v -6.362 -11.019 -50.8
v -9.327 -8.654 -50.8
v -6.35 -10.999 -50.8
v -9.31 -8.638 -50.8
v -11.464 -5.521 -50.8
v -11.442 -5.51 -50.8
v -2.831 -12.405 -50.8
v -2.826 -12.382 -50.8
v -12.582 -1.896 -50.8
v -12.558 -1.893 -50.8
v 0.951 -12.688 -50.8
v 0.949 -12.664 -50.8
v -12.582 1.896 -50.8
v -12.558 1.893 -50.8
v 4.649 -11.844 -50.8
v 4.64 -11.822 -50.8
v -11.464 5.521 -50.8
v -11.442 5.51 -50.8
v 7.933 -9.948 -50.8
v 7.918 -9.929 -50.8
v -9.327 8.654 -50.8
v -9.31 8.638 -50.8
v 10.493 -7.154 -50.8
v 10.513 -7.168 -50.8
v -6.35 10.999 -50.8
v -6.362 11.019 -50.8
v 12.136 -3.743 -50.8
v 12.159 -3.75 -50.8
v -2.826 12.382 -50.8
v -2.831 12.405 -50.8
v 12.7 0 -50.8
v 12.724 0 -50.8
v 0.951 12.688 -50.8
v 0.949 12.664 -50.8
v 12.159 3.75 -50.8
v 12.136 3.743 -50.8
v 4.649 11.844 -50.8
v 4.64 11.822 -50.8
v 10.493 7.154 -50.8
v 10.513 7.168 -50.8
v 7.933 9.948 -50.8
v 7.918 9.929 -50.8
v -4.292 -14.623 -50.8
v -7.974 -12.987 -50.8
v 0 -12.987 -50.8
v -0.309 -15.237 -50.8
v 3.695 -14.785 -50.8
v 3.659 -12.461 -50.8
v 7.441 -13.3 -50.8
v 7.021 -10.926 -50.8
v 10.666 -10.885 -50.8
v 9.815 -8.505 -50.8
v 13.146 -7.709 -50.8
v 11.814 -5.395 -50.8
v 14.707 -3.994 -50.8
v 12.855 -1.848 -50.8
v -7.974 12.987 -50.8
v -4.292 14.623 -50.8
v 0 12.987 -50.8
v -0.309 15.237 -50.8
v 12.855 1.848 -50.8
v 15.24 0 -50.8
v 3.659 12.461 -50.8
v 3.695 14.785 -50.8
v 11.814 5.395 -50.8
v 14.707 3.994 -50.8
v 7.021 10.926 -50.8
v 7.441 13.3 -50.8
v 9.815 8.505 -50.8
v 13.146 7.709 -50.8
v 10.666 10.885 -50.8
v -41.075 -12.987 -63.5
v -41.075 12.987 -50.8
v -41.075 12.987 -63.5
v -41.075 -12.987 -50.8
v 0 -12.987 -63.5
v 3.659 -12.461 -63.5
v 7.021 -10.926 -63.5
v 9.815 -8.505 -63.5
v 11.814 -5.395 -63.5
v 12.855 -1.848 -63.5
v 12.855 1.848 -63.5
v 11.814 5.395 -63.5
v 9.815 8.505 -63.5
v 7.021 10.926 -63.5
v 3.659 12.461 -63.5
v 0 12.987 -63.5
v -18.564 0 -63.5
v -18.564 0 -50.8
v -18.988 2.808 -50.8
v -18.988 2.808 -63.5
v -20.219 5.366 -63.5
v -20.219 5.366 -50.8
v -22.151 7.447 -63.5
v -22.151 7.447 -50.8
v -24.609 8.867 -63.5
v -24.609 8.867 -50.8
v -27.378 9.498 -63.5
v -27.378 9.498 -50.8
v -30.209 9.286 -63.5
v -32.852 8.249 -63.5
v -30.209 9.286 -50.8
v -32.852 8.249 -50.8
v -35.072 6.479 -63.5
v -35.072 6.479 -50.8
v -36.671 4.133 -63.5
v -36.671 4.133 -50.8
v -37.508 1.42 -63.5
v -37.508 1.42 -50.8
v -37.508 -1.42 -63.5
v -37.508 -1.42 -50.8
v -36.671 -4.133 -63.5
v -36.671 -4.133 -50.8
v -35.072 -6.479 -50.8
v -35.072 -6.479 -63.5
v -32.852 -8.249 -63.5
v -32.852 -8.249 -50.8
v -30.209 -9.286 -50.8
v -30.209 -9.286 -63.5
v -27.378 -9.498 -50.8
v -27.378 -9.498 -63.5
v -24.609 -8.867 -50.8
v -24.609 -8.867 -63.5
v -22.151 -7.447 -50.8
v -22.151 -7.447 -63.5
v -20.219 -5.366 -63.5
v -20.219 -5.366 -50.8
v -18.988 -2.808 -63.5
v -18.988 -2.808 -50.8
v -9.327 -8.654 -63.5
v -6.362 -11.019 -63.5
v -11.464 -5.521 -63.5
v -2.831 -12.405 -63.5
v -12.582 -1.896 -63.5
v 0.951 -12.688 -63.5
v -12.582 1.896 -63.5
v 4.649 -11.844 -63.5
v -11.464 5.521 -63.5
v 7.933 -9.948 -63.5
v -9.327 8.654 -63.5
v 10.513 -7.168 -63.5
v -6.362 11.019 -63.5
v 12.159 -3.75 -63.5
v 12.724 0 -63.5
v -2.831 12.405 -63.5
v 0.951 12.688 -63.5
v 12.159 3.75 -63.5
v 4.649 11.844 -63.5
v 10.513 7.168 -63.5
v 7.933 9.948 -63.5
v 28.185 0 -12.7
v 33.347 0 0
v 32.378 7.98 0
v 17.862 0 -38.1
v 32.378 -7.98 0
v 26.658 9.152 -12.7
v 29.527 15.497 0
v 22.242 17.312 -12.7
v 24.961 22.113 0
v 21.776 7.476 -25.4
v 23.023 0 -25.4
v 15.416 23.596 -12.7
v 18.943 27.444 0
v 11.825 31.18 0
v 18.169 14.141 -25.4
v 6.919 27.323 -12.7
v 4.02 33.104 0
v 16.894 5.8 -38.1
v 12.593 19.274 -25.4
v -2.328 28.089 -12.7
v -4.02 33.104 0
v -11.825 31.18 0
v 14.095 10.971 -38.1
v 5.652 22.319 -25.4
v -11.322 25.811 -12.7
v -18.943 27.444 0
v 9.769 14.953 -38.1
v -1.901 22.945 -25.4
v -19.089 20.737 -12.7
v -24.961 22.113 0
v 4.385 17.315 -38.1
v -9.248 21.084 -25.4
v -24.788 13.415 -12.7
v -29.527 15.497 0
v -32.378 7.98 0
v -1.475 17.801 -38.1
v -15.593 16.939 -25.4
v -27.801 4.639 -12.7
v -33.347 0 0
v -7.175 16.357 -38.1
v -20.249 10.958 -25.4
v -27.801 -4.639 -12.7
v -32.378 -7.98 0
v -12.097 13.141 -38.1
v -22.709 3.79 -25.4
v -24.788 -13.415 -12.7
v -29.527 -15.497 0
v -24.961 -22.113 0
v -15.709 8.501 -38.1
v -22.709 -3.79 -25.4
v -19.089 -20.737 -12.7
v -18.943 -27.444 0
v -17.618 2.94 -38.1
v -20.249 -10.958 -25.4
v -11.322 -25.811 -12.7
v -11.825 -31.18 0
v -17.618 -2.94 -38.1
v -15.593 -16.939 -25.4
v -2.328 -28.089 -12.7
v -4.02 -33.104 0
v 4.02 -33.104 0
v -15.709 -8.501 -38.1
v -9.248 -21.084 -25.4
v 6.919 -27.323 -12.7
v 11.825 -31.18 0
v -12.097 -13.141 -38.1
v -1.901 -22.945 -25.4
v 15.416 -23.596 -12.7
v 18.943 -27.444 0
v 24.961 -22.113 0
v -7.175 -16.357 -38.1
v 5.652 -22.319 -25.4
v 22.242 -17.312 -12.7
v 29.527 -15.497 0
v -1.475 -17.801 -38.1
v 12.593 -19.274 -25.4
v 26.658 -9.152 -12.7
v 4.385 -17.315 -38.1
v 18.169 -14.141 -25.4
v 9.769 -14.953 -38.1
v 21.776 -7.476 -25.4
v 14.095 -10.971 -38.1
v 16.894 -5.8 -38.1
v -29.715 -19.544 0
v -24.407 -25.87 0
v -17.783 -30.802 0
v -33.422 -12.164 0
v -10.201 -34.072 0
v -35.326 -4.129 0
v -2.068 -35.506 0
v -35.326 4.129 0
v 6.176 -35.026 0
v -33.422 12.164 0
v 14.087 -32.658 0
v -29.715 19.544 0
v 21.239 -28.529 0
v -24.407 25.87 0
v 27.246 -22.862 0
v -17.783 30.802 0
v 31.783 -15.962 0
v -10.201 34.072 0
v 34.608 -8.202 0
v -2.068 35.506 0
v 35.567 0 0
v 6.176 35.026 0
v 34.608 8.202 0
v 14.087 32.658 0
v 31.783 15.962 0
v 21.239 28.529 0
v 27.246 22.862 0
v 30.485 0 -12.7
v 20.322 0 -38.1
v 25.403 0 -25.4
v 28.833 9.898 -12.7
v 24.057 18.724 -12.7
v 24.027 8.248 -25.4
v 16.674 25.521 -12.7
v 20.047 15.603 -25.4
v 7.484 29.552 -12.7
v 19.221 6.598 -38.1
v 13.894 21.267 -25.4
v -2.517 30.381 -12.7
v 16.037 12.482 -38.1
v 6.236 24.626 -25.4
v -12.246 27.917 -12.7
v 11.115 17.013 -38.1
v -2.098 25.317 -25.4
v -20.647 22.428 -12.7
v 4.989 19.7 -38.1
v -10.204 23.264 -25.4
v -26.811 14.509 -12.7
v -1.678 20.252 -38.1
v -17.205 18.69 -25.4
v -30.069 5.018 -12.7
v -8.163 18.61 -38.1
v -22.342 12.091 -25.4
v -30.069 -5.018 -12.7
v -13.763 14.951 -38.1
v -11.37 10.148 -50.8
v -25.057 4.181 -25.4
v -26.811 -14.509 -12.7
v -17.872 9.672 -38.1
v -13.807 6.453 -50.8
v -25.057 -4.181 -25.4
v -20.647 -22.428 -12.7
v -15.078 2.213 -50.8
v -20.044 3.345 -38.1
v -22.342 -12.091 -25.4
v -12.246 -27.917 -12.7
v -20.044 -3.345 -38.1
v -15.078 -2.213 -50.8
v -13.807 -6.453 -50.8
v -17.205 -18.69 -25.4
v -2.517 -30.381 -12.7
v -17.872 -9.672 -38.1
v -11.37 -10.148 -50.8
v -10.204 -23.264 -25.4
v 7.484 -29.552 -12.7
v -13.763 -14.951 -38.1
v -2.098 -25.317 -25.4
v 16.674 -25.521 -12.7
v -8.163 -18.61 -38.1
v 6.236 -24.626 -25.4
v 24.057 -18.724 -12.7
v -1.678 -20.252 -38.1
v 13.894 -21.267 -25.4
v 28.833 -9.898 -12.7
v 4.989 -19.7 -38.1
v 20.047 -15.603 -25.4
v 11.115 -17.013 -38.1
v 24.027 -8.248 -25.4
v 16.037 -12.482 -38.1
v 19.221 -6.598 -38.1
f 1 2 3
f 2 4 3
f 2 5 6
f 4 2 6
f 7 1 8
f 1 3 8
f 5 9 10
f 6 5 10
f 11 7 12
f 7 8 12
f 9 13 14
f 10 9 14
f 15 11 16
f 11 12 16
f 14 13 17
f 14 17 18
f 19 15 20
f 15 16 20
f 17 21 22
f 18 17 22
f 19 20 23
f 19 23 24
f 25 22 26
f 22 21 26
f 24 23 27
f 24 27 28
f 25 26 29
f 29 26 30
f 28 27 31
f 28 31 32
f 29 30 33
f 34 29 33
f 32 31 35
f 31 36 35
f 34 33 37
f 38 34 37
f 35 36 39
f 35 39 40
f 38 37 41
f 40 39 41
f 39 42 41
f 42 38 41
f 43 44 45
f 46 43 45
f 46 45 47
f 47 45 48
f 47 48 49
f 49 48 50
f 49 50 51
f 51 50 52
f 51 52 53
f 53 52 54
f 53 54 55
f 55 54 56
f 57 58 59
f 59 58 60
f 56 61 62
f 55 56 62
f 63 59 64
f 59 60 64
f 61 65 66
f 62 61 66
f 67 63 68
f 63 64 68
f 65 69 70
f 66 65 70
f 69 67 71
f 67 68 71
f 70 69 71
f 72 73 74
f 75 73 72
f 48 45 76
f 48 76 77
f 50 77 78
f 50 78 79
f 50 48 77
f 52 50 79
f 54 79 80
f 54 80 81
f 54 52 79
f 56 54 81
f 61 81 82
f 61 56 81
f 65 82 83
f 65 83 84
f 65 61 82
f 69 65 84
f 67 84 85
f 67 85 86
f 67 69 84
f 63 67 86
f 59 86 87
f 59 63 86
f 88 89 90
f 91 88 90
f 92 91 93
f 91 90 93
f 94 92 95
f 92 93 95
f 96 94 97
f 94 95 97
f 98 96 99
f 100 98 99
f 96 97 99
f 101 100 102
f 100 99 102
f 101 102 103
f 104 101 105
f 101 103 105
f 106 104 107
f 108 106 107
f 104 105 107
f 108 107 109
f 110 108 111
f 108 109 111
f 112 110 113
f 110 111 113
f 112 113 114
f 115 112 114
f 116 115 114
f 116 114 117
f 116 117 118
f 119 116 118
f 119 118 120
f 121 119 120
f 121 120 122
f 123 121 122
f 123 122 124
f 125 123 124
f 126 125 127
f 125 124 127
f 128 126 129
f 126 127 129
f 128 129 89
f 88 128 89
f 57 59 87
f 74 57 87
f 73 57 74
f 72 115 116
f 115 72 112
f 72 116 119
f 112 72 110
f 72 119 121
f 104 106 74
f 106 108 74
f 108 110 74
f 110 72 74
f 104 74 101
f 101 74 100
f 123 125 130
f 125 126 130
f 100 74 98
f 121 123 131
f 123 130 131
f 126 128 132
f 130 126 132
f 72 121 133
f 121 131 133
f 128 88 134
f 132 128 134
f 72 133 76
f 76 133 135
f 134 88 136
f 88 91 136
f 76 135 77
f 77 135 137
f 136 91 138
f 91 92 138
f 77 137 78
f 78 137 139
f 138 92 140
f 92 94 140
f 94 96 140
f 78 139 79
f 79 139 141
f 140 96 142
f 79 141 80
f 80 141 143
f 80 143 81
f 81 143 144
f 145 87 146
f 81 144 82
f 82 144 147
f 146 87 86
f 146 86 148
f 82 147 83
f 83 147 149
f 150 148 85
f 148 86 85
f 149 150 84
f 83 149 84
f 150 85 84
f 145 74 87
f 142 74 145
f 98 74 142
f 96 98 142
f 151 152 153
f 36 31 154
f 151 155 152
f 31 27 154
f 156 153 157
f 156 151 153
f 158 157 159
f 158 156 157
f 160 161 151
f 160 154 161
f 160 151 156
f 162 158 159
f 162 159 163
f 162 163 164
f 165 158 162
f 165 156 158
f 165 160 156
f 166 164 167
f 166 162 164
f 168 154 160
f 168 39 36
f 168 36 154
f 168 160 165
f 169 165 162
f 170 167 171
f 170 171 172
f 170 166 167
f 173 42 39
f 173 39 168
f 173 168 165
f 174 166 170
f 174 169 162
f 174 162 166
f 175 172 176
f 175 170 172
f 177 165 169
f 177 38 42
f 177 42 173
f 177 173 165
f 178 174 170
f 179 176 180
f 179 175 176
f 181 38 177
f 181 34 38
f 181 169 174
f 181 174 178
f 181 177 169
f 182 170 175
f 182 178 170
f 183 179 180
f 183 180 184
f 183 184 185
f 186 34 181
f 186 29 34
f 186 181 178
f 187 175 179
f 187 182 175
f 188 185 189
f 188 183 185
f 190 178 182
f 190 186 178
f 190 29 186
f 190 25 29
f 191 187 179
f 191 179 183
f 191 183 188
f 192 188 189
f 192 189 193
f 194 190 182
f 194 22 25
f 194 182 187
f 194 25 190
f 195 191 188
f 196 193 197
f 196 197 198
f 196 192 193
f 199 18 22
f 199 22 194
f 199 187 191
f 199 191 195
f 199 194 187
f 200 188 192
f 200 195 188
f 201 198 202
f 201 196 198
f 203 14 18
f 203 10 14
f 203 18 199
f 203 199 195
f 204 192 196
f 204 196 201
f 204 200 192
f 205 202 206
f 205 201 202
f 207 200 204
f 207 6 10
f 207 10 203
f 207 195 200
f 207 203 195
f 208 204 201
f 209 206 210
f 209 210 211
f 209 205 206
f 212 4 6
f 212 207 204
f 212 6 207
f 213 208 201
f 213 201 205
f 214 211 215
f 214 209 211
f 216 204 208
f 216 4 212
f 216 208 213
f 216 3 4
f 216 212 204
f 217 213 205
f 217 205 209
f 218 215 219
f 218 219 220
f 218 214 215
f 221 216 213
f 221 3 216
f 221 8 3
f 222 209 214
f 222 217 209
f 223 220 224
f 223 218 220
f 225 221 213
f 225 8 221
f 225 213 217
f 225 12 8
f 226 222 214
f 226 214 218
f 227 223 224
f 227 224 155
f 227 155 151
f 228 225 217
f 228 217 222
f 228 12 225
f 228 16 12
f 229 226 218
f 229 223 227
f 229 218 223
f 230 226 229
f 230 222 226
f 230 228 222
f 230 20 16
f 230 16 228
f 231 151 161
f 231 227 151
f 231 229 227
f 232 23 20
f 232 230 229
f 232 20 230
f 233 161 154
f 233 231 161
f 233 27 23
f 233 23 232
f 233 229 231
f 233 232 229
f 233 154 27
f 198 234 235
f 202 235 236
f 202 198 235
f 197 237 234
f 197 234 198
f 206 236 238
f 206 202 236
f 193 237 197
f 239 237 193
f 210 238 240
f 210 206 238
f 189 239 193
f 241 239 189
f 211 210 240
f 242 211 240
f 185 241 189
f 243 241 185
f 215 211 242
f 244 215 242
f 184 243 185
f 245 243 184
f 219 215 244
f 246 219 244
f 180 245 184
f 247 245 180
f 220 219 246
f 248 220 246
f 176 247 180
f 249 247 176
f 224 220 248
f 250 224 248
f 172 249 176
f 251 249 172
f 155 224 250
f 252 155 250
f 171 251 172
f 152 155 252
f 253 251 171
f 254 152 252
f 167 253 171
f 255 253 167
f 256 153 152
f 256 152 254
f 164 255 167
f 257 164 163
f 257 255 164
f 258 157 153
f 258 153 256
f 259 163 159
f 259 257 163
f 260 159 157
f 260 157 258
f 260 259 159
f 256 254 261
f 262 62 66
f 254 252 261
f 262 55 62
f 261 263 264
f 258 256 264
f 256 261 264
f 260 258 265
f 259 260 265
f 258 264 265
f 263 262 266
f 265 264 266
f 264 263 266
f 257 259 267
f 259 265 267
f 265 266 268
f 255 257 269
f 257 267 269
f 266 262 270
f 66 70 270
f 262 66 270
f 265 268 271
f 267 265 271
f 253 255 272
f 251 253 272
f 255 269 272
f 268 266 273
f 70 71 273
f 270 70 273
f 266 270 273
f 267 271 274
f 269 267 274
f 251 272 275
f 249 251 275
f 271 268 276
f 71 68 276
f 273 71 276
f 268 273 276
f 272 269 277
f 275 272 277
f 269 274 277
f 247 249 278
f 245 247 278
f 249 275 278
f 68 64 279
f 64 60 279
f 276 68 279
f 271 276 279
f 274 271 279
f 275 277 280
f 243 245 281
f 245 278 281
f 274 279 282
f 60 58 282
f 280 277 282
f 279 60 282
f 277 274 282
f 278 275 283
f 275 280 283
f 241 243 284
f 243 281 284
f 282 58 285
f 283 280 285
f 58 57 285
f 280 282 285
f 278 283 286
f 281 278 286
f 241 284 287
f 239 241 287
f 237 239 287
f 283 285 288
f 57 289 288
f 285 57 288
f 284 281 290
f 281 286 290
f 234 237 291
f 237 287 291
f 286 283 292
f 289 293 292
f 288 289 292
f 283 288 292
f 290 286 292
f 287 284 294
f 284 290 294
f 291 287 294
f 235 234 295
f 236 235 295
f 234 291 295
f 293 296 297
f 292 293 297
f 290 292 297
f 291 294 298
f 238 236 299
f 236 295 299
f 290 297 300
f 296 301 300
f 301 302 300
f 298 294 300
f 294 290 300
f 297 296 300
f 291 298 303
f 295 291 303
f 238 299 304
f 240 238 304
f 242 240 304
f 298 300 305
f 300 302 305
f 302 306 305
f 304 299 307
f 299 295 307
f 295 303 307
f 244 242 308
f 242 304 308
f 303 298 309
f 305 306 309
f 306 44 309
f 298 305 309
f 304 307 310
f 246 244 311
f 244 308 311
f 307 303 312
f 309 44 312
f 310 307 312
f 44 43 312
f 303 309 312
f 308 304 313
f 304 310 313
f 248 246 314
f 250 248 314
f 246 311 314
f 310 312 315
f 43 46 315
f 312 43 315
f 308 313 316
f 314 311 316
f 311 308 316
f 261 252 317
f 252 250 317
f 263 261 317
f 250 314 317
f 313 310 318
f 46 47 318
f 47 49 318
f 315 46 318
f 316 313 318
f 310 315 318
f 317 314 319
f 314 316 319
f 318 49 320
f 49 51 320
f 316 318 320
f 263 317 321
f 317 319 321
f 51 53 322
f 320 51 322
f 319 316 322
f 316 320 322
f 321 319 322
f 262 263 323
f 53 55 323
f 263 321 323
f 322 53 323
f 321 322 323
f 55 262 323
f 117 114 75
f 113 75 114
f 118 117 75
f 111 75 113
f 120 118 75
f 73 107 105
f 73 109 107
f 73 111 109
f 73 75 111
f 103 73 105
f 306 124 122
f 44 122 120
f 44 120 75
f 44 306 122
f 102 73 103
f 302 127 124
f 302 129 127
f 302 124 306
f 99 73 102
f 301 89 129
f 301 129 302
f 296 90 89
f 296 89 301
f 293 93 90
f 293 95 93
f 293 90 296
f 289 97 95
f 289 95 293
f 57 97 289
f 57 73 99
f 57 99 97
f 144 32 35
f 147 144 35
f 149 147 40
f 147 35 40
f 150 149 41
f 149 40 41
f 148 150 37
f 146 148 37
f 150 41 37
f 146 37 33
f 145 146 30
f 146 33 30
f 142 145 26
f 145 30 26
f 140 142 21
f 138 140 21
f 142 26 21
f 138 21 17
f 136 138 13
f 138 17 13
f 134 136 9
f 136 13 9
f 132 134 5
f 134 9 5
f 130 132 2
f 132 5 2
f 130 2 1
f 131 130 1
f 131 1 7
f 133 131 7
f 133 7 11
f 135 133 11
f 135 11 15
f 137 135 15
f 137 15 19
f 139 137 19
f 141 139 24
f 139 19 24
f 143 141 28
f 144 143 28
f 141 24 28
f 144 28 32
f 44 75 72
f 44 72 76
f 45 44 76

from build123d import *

# Parameters (mm, degrees)
F0_R     = 35.566543
F2_R     = 15.24
F4_R     = 33.346959
F5_R     = 12.7
F7_R     = 9.525
F7_R_2   = 12.723879
F8_DEPTH = 12.7


with BuildPart() as f3:
    # F0 (on Top) → F3 section 0
    with BuildSketch(Plane.XY):
        Circle(F0_R)
    # F2 (on offset) → F3 section 1
    with BuildSketch(Plane.XY.offset(-50.8)):
        Circle(F2_R)
    loft()

    # F4 (on Top) → F6 section 0
    with BuildSketch(Plane.XY):
        Circle(F4_R)
    # F5 (on offset) → F6 section 1
    with BuildSketch(Plane.XY.offset(-50.8)):
        Circle(F5_R)
    loft(mode=Mode.SUBTRACT)

    # F7 (on offset) → F8 (join)
    with BuildSketch(Plane.XY.offset(-50.8)):
        with BuildLine():
            Line((-0.354267, -12.987269), (0, -12.987269))
            ThreePointArc((0, -12.987269), (12.987269, 0), (0, 12.987269))
            Line((0, 12.987269), (-0.354267, 12.987269))
            Line((-0.354267, 12.987269), (-41.074779, 12.987269))
            Line((-41.074779, 12.987269), (-41.074779, -12.987269))
            Line((-41.074779, -12.987269), (-0.354267, -12.987269))
        make_face()
        with Locations((-28.089361, 0)):
            Circle(F7_R, mode=Mode.SUBTRACT)
        Circle(F7_R_2, mode=Mode.SUBTRACT)
    extrude(amount=-F8_DEPTH)


solid = f3.part
